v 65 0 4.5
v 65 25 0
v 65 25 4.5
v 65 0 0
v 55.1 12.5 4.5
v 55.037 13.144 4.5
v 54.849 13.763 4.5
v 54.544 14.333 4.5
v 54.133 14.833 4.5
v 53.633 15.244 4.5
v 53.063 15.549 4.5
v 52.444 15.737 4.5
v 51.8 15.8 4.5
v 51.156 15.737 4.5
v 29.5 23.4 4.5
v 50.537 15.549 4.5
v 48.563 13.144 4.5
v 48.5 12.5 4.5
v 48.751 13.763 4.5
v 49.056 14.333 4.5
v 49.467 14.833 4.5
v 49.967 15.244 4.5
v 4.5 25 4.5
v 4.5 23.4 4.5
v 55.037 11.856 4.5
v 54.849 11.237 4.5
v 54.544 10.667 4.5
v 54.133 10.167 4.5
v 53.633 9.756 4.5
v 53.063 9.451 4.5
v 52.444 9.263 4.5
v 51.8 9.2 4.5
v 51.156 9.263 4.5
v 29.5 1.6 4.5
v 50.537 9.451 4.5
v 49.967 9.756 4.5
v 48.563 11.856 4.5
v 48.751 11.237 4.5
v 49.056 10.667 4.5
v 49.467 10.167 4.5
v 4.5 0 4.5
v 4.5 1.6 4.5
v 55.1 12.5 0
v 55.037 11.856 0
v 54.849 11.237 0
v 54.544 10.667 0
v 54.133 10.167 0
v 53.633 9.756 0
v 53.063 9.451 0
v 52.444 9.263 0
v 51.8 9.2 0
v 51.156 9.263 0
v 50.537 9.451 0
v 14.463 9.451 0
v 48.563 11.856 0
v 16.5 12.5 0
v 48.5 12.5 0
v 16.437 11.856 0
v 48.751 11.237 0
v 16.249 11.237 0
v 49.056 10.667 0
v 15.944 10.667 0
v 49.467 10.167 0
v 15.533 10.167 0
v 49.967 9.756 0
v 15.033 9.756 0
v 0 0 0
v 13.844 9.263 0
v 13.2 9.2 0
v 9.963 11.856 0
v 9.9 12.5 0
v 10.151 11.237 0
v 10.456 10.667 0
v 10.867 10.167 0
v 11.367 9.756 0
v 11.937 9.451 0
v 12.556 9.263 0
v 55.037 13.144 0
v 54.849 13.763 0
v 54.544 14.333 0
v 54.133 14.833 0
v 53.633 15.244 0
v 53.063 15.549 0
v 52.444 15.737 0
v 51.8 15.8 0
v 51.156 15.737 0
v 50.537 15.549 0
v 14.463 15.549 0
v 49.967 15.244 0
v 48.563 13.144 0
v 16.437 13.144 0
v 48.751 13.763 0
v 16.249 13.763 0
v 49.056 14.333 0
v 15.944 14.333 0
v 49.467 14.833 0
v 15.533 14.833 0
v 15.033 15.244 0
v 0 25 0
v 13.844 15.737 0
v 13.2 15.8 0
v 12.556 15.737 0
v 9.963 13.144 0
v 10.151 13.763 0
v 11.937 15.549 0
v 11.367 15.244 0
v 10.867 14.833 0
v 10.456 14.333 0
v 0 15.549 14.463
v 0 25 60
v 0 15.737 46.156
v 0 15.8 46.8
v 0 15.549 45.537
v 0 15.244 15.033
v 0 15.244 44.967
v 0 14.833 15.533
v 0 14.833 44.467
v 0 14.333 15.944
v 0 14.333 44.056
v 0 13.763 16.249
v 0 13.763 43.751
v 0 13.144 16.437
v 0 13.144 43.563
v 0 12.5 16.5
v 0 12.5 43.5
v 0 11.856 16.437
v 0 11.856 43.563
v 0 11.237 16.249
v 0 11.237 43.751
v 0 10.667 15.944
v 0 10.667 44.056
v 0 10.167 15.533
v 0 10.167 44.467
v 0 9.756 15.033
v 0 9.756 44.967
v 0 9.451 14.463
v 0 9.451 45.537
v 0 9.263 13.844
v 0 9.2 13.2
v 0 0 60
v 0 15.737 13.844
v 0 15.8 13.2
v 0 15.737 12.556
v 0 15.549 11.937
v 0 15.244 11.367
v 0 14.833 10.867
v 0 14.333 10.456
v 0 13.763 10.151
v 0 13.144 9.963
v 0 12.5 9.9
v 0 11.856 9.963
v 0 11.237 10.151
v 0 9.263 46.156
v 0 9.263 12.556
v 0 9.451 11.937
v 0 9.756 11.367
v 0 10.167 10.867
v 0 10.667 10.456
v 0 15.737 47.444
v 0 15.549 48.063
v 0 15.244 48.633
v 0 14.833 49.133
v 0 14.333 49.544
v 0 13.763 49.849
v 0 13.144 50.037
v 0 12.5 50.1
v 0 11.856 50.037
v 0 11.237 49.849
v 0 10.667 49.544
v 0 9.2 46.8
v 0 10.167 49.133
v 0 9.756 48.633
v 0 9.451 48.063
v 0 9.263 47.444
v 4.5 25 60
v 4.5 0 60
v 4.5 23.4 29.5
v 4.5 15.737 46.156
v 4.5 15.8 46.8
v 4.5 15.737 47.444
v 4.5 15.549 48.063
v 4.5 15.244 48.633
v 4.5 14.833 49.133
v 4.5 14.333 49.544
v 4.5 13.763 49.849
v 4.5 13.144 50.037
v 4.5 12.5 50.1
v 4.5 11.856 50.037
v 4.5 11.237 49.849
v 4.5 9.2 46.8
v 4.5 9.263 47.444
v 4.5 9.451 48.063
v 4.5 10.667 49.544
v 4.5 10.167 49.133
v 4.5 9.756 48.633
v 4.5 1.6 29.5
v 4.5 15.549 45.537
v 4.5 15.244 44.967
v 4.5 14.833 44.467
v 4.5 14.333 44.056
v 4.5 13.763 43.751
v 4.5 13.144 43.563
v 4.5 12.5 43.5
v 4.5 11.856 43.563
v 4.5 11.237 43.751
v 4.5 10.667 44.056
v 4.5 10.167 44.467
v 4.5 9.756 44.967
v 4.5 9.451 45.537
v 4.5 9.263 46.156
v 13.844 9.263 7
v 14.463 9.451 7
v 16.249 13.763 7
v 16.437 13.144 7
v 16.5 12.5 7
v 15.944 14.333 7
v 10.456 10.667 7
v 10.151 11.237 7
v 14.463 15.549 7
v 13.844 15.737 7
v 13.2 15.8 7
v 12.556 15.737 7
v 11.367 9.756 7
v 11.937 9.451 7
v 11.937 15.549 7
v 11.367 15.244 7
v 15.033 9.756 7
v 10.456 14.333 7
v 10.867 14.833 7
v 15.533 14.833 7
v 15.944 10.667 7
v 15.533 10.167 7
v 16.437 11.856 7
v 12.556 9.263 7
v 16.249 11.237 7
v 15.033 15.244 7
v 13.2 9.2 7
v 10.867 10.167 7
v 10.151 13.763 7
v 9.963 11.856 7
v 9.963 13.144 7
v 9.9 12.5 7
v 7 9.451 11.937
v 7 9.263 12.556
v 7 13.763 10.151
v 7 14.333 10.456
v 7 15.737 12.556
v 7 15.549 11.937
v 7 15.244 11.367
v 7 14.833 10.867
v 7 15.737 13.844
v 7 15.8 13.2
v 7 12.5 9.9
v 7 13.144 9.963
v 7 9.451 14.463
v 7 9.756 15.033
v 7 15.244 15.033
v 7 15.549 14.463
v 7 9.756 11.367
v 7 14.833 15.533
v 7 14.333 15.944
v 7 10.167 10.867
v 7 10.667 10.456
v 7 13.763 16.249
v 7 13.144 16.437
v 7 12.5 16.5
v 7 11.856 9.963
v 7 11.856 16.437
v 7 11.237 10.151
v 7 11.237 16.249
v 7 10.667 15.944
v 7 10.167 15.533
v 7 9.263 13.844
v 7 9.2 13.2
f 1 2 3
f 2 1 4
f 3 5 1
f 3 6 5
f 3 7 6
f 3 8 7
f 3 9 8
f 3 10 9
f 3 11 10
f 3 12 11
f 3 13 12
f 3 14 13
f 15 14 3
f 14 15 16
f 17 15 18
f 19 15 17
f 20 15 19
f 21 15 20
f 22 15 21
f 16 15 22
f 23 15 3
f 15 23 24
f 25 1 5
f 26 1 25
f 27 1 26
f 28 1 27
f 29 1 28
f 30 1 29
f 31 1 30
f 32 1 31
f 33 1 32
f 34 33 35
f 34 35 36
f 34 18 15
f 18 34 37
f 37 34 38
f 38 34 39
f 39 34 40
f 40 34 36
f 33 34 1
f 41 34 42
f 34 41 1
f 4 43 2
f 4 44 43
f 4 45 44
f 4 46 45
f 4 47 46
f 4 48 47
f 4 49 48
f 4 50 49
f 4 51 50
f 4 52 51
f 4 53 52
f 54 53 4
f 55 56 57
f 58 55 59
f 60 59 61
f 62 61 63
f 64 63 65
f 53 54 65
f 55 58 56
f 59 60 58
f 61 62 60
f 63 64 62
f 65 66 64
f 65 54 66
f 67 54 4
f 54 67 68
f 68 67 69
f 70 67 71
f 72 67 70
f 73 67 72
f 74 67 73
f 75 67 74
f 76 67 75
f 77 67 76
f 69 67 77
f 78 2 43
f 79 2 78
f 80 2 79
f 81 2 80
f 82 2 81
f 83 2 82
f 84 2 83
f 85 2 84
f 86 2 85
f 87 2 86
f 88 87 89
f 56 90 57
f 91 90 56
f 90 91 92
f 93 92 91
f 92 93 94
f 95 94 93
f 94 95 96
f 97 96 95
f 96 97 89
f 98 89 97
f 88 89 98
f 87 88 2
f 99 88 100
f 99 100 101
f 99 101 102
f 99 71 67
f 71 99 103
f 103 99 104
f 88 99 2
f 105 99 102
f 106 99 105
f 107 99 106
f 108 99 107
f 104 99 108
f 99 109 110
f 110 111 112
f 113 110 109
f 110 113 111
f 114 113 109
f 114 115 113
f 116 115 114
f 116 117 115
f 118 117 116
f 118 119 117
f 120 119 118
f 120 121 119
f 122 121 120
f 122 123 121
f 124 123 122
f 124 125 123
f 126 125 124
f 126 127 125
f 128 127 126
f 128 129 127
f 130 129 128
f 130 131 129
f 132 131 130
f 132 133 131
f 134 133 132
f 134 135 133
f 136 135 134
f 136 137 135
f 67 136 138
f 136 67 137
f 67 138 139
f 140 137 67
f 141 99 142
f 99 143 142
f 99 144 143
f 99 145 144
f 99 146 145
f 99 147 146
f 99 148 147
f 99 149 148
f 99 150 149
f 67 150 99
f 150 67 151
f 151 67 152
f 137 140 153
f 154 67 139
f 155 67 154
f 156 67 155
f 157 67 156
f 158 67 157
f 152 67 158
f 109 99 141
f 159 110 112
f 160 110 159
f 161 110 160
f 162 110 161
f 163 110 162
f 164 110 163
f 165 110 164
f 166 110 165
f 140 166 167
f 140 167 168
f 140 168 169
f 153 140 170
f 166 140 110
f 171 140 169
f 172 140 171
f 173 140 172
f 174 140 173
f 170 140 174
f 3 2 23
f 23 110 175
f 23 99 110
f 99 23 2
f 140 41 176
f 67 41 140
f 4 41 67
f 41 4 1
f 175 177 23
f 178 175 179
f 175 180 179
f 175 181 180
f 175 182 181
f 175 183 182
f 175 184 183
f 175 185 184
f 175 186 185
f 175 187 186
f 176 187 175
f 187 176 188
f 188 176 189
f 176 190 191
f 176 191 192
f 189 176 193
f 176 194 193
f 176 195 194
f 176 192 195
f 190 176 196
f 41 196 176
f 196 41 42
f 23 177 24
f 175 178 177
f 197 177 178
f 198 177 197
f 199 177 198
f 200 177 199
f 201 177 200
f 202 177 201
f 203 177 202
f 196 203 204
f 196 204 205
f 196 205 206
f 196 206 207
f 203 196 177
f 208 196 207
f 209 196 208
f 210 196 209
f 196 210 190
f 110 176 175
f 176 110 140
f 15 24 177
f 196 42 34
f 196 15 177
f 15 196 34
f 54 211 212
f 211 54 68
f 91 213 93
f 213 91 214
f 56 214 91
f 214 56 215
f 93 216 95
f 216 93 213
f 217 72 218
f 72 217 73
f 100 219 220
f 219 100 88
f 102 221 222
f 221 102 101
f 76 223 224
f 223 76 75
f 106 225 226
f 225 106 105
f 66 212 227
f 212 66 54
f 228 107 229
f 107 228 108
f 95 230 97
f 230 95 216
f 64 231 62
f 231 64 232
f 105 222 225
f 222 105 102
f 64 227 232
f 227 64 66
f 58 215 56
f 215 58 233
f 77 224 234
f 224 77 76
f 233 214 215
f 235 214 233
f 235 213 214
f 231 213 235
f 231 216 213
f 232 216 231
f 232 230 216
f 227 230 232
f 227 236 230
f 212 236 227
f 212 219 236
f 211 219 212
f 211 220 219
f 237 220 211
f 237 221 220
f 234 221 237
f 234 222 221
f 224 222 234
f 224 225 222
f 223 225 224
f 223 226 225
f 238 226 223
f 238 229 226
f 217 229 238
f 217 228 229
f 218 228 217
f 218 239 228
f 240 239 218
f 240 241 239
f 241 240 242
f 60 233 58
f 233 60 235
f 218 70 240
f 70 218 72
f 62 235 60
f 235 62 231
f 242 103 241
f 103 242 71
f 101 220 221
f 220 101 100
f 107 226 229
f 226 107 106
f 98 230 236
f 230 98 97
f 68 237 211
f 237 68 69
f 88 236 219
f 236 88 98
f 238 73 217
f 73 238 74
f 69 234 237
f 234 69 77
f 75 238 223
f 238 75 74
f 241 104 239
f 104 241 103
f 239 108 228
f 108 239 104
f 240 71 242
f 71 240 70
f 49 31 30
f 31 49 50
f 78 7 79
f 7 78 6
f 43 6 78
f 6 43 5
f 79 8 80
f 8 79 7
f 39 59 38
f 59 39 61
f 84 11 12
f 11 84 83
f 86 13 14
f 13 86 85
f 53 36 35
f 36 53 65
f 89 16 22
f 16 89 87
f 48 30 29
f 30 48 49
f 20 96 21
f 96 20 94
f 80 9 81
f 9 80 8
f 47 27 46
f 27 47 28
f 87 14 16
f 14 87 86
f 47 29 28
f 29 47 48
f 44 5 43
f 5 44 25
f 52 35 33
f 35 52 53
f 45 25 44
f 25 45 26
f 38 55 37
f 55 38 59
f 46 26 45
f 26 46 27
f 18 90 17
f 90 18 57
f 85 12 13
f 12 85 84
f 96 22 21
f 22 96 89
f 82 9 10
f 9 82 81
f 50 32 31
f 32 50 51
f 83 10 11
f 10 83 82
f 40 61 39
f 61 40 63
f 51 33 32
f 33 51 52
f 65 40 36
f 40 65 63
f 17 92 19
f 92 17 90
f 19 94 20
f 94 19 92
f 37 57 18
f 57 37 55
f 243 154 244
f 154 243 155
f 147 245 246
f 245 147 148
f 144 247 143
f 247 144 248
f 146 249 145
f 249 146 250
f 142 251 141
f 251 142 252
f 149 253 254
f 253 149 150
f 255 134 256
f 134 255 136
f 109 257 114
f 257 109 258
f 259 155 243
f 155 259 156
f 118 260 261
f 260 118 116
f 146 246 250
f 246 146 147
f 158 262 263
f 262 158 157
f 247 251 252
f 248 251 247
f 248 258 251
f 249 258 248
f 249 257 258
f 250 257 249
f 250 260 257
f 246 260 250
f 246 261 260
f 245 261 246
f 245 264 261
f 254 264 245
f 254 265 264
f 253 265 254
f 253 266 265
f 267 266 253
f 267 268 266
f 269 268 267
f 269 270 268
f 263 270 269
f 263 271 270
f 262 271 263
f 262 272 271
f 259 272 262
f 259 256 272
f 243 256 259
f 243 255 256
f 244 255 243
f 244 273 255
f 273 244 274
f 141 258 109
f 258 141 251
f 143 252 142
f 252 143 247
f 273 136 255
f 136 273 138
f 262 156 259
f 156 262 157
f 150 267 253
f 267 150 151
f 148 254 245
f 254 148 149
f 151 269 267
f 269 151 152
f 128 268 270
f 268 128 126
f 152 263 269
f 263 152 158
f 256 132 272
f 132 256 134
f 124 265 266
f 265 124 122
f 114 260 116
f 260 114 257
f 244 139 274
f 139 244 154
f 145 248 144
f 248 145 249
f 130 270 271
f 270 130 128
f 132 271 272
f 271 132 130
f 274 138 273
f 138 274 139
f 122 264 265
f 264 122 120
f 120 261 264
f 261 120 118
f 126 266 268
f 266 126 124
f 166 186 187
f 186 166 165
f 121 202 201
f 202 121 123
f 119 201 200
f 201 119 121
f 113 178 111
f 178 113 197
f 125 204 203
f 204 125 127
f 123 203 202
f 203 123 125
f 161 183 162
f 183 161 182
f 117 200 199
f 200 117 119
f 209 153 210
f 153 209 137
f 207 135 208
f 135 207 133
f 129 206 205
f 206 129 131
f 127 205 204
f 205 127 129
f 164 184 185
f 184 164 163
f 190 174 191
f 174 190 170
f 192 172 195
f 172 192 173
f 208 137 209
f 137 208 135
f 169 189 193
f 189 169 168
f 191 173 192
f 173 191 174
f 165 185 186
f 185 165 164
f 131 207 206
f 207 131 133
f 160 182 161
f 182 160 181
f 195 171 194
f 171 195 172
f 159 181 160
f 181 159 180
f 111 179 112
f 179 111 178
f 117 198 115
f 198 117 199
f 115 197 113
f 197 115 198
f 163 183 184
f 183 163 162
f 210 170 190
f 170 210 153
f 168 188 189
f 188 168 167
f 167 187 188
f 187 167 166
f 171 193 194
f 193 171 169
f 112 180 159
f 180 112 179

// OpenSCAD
$fn = 32;

// ----------------------------------------------------------------------
// L-bracket: 65 x 25 x 60 mm
// ----------------------------------------------------------------------

// --- parameters (mm) ---
horiz_len = 65;           // horizontal leg, X
vert_len = 60;            // vertical leg, Z
profile_w = 25;           // bracket depth, Y
plate_t = 4.5;            // plate thickness
hole_d = 6.6;             // clearance for M6
rib_leg = 32.4;           // gusset leg
rib_sink = 1.6;           // gusset overlap into the plates

module hole_z(px, py) {
  translate([px, py, -2.5]) cylinder(h = plate_t + 5, d = hole_d);
}
module hole_x(pz, py) {
  translate([-2.5, py, pz]) rotate([0, 90, 0]) cylinder(h = plate_t + 5, d = hole_d);
}
module gusset() {
  translate([0, profile_w - rib_sink, 0])
    rotate([90, 0, 0])
      linear_extrude(height = profile_w - 2 * rib_sink)
        polygon(points = [[rib_sink, rib_sink], [rib_leg, rib_sink], [rib_sink, rib_leg]]);
}

difference() {
  union() {
    /* horizontal leg */
    cube([horiz_len, profile_w, plate_t]);
    /* vertical leg, overlapping the corner block */
    cube([plate_t, profile_w, vert_len]);
    gusset();
  }
  hole_z(13.2, 12.5);
  hole_z(51.8, 12.5);
  hole_x(13.2, 12.5);
  hole_x(46.8, 12.5);
}
